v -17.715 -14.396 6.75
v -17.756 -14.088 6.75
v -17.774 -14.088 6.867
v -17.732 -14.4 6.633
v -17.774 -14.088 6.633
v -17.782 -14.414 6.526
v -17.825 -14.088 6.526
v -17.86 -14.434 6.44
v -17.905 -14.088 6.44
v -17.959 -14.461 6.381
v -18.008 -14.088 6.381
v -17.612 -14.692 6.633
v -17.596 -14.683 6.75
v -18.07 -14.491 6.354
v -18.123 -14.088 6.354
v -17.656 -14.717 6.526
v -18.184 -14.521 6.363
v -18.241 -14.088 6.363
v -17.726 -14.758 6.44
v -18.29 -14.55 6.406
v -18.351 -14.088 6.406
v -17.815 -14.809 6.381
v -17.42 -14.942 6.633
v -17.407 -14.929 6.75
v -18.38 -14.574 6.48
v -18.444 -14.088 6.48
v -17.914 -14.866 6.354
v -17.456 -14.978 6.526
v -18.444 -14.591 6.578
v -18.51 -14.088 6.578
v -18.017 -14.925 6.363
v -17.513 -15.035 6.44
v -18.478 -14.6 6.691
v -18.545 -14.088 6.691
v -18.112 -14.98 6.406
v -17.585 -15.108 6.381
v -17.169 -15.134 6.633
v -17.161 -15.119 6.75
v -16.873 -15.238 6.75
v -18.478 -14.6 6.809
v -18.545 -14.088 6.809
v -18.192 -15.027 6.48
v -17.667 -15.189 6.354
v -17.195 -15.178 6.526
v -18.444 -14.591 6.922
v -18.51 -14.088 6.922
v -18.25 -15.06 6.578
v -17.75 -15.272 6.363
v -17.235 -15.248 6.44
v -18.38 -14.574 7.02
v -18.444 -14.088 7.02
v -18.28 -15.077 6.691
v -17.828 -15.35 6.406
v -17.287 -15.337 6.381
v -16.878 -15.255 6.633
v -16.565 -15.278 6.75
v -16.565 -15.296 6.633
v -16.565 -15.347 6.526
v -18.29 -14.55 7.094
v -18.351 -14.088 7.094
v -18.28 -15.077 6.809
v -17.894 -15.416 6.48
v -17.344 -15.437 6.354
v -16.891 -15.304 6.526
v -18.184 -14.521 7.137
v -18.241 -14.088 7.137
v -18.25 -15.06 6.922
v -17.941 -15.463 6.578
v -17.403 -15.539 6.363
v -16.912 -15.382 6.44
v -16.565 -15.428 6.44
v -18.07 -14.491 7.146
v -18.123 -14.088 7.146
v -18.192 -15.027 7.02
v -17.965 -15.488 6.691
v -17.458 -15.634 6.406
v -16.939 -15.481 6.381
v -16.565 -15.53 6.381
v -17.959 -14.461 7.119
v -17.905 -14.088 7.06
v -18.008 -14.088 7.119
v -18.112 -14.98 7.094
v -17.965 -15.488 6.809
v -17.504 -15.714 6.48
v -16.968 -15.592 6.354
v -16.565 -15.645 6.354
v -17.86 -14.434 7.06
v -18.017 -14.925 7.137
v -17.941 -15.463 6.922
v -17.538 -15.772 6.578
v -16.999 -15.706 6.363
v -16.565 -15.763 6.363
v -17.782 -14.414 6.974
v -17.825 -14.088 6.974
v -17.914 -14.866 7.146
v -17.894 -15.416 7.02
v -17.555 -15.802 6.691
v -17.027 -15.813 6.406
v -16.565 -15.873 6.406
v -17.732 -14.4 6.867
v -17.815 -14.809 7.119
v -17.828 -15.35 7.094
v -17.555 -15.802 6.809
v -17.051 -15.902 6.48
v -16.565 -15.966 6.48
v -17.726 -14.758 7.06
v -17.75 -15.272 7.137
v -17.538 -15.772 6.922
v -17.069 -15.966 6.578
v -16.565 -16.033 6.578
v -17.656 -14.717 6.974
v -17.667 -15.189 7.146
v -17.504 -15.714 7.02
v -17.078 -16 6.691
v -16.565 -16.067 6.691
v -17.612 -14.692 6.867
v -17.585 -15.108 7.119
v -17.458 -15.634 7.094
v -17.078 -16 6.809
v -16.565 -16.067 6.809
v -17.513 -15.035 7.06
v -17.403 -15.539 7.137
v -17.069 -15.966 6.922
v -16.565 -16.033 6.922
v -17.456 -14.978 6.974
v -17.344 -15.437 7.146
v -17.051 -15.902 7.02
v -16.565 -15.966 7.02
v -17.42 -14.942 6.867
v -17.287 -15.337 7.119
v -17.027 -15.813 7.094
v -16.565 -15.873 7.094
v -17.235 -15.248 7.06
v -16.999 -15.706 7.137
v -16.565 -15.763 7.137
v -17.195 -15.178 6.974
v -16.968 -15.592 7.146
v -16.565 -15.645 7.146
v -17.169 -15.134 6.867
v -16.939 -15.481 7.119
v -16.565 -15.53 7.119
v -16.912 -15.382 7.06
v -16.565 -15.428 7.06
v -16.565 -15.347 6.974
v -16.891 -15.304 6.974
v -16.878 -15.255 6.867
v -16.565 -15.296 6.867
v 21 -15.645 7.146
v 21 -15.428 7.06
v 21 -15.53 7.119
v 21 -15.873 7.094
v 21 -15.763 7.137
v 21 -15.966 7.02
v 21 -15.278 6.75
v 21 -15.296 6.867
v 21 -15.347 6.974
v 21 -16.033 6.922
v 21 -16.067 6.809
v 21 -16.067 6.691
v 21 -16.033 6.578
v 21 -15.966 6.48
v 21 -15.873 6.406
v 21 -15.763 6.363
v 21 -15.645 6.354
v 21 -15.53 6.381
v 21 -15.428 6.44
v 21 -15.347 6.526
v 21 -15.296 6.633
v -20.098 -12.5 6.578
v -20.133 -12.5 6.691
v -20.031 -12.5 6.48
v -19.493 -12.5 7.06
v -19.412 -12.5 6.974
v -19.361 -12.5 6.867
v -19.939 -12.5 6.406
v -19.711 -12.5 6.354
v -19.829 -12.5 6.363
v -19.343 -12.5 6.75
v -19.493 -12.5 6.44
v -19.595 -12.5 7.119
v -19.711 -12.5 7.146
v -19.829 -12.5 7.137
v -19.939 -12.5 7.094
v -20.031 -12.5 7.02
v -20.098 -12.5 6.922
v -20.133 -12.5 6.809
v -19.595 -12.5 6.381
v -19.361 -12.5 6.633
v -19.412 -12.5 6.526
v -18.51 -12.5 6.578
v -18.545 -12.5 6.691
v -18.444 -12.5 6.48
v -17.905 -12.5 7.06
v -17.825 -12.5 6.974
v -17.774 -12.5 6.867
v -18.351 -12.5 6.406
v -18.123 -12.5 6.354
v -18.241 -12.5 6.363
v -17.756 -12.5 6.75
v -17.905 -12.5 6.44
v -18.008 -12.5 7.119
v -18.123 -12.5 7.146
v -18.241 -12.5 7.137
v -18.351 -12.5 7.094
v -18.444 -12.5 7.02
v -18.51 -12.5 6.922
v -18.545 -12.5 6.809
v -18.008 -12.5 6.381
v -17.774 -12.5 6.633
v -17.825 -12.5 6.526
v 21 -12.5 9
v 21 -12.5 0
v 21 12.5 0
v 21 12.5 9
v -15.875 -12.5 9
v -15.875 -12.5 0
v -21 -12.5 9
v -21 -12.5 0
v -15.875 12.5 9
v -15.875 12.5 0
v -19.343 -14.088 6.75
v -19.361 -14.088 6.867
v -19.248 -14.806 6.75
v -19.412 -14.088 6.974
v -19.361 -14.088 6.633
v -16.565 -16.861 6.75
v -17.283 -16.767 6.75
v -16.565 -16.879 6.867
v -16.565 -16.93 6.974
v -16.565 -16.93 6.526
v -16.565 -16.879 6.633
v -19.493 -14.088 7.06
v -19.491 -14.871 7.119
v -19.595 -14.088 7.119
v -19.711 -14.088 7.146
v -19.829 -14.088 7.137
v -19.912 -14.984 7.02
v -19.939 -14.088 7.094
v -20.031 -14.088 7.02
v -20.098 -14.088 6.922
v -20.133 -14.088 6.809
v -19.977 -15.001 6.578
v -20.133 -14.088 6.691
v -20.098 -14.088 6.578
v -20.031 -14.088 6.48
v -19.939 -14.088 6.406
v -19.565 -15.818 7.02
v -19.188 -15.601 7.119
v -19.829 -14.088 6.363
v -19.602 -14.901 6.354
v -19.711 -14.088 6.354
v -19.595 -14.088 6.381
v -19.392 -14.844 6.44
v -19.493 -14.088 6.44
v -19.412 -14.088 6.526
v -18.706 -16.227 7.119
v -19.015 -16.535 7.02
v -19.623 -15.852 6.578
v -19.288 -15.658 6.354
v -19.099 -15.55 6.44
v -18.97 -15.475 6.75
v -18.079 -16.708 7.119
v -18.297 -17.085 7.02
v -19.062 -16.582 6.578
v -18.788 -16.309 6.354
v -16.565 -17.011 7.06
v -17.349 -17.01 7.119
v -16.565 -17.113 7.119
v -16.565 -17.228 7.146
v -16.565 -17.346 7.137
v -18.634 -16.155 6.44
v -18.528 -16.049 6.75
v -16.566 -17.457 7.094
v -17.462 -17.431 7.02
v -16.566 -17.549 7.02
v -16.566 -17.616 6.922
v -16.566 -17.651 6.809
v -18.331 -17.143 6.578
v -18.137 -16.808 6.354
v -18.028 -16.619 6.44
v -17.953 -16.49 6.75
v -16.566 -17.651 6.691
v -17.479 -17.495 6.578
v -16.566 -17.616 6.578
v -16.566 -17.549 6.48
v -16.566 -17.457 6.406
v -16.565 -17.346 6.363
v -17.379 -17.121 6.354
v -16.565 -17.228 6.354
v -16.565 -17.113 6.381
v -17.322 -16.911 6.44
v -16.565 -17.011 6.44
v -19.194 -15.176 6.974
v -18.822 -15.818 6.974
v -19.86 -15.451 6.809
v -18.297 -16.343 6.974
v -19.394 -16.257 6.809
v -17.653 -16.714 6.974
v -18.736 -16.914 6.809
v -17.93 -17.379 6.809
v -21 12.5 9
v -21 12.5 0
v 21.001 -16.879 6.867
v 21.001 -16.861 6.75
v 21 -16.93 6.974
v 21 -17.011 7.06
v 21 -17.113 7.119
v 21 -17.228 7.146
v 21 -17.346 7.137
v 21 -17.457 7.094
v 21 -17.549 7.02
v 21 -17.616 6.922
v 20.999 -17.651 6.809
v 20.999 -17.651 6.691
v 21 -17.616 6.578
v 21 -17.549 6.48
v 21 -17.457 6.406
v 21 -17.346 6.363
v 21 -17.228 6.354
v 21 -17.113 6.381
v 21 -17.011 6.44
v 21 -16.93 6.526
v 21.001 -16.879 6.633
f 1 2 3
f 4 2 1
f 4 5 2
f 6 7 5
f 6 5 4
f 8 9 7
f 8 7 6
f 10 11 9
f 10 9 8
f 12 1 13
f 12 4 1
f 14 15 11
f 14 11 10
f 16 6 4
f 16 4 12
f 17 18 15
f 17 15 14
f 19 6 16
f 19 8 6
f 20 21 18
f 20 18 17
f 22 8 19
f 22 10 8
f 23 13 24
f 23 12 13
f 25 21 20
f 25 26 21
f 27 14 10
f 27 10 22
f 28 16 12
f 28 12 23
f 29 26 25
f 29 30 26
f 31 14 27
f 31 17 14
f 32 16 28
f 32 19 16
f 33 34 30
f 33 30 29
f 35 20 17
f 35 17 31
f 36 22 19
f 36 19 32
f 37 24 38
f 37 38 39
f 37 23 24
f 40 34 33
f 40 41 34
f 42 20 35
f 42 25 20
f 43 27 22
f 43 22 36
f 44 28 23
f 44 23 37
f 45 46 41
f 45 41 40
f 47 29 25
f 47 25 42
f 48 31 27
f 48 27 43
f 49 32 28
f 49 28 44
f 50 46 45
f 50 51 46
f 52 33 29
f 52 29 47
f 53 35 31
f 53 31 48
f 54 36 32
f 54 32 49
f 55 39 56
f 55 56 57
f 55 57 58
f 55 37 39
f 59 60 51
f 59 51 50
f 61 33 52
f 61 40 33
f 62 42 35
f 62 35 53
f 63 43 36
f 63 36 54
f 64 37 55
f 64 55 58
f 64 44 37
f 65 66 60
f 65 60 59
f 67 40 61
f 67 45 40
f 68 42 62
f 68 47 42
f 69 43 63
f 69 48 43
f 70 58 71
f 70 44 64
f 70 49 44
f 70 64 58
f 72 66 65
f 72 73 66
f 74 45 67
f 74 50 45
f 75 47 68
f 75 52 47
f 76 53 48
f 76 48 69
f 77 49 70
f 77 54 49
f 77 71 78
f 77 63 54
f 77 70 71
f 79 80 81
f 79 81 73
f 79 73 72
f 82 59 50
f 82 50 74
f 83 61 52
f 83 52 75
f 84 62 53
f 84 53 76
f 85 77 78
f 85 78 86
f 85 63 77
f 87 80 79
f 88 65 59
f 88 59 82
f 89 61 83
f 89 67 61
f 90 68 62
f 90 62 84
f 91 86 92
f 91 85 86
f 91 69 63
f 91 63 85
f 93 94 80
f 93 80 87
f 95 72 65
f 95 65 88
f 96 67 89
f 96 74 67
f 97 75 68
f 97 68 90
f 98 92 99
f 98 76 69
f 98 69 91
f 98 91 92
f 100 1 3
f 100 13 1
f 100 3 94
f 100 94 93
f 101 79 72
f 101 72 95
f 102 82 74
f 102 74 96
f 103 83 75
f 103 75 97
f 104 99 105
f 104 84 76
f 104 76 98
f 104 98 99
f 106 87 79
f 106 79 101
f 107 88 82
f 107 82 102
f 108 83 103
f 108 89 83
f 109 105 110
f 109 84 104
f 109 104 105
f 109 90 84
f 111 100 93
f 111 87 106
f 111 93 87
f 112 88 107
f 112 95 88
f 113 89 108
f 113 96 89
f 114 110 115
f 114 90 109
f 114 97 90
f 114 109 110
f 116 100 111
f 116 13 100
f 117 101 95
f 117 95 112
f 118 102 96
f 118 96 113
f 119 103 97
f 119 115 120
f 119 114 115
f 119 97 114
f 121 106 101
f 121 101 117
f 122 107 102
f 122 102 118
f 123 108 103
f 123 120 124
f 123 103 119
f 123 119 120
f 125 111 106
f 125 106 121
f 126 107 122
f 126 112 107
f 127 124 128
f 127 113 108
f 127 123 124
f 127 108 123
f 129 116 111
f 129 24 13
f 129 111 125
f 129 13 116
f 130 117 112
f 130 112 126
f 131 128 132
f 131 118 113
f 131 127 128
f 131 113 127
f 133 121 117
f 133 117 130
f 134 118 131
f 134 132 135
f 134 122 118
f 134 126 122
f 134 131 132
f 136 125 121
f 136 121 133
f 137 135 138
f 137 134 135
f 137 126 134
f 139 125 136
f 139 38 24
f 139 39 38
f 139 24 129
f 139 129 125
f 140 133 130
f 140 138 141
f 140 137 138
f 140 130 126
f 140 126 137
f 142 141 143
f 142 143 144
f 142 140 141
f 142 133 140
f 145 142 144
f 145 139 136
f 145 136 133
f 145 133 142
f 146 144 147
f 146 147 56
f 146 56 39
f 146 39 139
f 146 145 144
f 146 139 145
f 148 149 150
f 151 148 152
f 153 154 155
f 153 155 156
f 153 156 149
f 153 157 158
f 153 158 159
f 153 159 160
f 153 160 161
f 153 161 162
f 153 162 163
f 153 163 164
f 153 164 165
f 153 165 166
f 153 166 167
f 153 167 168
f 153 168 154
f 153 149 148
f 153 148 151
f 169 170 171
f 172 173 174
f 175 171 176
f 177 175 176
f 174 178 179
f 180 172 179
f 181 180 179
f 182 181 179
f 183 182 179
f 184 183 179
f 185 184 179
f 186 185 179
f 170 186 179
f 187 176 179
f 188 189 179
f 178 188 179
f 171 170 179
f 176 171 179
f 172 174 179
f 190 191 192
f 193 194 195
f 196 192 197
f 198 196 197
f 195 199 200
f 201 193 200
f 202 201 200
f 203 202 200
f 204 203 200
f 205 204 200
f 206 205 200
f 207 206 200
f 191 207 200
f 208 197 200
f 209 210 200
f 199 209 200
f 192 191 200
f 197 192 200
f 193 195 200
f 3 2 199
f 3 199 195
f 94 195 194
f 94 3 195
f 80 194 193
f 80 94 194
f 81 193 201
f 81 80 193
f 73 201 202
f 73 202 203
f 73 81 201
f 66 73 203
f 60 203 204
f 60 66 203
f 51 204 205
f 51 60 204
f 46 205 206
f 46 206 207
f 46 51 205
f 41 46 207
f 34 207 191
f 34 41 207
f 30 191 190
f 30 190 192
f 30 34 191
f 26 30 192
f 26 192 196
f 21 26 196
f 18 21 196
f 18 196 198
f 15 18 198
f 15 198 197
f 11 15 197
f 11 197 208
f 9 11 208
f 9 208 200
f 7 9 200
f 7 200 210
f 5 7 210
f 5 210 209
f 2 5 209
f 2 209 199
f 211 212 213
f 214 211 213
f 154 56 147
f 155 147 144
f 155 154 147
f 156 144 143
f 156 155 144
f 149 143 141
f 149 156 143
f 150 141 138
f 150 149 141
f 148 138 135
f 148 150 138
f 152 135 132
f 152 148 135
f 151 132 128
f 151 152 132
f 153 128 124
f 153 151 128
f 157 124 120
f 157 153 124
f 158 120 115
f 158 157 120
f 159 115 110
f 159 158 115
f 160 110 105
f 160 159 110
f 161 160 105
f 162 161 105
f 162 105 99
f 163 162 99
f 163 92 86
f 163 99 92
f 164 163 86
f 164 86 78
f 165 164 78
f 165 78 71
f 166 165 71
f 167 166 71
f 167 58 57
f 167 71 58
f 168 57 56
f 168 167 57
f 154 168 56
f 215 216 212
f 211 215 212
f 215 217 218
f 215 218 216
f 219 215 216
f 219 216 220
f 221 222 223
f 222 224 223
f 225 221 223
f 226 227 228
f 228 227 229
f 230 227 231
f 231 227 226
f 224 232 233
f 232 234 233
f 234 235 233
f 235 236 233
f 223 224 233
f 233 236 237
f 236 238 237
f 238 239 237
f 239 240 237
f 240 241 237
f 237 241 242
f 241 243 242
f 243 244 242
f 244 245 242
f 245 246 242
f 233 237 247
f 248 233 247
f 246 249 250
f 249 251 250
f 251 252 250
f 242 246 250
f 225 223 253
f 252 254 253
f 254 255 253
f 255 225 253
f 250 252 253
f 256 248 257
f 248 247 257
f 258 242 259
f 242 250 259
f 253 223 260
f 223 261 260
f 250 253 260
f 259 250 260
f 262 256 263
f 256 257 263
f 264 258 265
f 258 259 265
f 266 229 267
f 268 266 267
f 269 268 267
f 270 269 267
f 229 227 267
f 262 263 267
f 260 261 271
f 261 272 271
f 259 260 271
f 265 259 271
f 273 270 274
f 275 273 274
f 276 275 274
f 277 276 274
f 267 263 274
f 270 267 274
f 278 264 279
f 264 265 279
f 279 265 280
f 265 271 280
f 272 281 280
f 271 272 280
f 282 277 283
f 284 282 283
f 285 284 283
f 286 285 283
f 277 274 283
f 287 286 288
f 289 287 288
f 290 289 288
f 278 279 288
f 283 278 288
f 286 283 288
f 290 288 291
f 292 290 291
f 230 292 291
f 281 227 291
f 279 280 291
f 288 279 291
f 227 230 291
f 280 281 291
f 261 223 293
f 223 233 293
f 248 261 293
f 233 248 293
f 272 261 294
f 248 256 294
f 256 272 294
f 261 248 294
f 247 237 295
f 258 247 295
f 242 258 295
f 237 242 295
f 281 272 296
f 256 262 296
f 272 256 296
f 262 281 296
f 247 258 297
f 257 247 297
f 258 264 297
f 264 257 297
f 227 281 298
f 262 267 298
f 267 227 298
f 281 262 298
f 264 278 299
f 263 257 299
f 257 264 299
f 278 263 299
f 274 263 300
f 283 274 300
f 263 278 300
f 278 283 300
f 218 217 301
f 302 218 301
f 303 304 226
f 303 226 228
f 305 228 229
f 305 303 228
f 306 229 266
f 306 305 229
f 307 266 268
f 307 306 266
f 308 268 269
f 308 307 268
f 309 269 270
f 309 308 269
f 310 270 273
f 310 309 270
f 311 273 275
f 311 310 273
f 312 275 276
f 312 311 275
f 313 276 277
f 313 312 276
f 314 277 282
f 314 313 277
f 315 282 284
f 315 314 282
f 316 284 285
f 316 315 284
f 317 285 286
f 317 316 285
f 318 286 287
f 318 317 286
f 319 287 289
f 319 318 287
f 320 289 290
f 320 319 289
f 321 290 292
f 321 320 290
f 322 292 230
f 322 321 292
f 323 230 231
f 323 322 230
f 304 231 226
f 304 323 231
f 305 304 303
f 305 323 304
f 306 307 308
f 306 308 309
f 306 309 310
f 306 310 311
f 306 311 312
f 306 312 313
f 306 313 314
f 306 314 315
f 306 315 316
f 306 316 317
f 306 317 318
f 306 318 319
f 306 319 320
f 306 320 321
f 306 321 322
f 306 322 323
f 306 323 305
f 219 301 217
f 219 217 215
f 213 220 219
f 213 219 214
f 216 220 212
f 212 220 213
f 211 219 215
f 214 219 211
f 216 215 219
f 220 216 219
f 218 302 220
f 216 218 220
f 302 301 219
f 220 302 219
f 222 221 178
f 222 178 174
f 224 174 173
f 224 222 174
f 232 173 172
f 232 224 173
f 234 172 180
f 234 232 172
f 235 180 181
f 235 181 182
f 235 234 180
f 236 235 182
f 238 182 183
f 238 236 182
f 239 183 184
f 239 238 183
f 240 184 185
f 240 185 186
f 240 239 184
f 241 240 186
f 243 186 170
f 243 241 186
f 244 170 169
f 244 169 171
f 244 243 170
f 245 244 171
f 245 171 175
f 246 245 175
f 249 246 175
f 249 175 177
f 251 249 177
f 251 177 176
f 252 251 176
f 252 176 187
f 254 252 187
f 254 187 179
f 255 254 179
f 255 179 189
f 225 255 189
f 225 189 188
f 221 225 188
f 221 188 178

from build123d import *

# Parameters (mm, degrees)
F0_W     = 42
F0_H     = 25
F1_DEPTH = 9
F2_W     = 5.125
F2_H     = 25
F3_DEPTH = 9.001
F4_DEPTH = 9
F6_R     = 0.396875


with BuildPart() as f1:
    # F0 (on Top) → F1 (new body)
    with BuildSketch(Plane.XY):
        Rectangle(F0_W, F0_H)
    extrude(amount=F1_DEPTH)

    # F2 (on face) → F3 (cut, through all)
    with BuildSketch(Plane.XY.offset(9)):
        with Locations((-18.4375, 0)):
            Rectangle(F2_W, F2_H)
    extrude(amount=-F3_DEPTH, mode=Mode.SUBTRACT)


with BuildPart() as f4:
    # F2 (on face) → F4 (new body)
    with BuildSketch(Plane.XY.offset(9)):
        with Locations((-18.4375, 0)):
            Rectangle(F2_W, F2_H)
    extrude(amount=-F4_DEPTH)


with BuildPart() as f8:
    # F8: sweep along a path in F7
    with BuildLine(Plane.XY.offset(6.75)) as f8_path:
        Line((-18.1527560161, -12.5), (-18.1527560161, -14.0875))
        ThreePointArc((-18.1527560161, -14.0875), (-17.6877880312, -15.2100320151), (-16.5652560161, -15.675))
        Line((-16.5652560161, -15.675), (21, -15.675))
    # F6 (on face) → F8 (sweep)
    with BuildSketch(Plane.XZ.offset(12.5)):
        with Locations((-18.1527560161, 6.75)):
            Circle(F6_R)
    sweep(path=f8_path.line)


with BuildPart() as f9:
    # F9: sweep along a path in F7
    with BuildLine(Plane.XY.offset(6.75)) as f9_path:
        Line((-19.7402560161, -12.5), (-19.7402560161, -14.0875))
        ThreePointArc((-19.7402560161, -14.0875), (-18.8087535161, -16.3296983837), (-16.5652560161, -17.2580676353))
        Line((-16.5652560161, -17.2580676353), (21, -17.2580676353))
    # F6 (on face) → F9 (sweep)
    with BuildSketch(Plane.XZ.offset(12.5)):
        with Locations((-19.7402560161, 6.75)):
            Circle(F6_R)
    sweep(path=f9_path.line)


solid = Compound([f1.part, f4.part, f8.part, f9.part])
